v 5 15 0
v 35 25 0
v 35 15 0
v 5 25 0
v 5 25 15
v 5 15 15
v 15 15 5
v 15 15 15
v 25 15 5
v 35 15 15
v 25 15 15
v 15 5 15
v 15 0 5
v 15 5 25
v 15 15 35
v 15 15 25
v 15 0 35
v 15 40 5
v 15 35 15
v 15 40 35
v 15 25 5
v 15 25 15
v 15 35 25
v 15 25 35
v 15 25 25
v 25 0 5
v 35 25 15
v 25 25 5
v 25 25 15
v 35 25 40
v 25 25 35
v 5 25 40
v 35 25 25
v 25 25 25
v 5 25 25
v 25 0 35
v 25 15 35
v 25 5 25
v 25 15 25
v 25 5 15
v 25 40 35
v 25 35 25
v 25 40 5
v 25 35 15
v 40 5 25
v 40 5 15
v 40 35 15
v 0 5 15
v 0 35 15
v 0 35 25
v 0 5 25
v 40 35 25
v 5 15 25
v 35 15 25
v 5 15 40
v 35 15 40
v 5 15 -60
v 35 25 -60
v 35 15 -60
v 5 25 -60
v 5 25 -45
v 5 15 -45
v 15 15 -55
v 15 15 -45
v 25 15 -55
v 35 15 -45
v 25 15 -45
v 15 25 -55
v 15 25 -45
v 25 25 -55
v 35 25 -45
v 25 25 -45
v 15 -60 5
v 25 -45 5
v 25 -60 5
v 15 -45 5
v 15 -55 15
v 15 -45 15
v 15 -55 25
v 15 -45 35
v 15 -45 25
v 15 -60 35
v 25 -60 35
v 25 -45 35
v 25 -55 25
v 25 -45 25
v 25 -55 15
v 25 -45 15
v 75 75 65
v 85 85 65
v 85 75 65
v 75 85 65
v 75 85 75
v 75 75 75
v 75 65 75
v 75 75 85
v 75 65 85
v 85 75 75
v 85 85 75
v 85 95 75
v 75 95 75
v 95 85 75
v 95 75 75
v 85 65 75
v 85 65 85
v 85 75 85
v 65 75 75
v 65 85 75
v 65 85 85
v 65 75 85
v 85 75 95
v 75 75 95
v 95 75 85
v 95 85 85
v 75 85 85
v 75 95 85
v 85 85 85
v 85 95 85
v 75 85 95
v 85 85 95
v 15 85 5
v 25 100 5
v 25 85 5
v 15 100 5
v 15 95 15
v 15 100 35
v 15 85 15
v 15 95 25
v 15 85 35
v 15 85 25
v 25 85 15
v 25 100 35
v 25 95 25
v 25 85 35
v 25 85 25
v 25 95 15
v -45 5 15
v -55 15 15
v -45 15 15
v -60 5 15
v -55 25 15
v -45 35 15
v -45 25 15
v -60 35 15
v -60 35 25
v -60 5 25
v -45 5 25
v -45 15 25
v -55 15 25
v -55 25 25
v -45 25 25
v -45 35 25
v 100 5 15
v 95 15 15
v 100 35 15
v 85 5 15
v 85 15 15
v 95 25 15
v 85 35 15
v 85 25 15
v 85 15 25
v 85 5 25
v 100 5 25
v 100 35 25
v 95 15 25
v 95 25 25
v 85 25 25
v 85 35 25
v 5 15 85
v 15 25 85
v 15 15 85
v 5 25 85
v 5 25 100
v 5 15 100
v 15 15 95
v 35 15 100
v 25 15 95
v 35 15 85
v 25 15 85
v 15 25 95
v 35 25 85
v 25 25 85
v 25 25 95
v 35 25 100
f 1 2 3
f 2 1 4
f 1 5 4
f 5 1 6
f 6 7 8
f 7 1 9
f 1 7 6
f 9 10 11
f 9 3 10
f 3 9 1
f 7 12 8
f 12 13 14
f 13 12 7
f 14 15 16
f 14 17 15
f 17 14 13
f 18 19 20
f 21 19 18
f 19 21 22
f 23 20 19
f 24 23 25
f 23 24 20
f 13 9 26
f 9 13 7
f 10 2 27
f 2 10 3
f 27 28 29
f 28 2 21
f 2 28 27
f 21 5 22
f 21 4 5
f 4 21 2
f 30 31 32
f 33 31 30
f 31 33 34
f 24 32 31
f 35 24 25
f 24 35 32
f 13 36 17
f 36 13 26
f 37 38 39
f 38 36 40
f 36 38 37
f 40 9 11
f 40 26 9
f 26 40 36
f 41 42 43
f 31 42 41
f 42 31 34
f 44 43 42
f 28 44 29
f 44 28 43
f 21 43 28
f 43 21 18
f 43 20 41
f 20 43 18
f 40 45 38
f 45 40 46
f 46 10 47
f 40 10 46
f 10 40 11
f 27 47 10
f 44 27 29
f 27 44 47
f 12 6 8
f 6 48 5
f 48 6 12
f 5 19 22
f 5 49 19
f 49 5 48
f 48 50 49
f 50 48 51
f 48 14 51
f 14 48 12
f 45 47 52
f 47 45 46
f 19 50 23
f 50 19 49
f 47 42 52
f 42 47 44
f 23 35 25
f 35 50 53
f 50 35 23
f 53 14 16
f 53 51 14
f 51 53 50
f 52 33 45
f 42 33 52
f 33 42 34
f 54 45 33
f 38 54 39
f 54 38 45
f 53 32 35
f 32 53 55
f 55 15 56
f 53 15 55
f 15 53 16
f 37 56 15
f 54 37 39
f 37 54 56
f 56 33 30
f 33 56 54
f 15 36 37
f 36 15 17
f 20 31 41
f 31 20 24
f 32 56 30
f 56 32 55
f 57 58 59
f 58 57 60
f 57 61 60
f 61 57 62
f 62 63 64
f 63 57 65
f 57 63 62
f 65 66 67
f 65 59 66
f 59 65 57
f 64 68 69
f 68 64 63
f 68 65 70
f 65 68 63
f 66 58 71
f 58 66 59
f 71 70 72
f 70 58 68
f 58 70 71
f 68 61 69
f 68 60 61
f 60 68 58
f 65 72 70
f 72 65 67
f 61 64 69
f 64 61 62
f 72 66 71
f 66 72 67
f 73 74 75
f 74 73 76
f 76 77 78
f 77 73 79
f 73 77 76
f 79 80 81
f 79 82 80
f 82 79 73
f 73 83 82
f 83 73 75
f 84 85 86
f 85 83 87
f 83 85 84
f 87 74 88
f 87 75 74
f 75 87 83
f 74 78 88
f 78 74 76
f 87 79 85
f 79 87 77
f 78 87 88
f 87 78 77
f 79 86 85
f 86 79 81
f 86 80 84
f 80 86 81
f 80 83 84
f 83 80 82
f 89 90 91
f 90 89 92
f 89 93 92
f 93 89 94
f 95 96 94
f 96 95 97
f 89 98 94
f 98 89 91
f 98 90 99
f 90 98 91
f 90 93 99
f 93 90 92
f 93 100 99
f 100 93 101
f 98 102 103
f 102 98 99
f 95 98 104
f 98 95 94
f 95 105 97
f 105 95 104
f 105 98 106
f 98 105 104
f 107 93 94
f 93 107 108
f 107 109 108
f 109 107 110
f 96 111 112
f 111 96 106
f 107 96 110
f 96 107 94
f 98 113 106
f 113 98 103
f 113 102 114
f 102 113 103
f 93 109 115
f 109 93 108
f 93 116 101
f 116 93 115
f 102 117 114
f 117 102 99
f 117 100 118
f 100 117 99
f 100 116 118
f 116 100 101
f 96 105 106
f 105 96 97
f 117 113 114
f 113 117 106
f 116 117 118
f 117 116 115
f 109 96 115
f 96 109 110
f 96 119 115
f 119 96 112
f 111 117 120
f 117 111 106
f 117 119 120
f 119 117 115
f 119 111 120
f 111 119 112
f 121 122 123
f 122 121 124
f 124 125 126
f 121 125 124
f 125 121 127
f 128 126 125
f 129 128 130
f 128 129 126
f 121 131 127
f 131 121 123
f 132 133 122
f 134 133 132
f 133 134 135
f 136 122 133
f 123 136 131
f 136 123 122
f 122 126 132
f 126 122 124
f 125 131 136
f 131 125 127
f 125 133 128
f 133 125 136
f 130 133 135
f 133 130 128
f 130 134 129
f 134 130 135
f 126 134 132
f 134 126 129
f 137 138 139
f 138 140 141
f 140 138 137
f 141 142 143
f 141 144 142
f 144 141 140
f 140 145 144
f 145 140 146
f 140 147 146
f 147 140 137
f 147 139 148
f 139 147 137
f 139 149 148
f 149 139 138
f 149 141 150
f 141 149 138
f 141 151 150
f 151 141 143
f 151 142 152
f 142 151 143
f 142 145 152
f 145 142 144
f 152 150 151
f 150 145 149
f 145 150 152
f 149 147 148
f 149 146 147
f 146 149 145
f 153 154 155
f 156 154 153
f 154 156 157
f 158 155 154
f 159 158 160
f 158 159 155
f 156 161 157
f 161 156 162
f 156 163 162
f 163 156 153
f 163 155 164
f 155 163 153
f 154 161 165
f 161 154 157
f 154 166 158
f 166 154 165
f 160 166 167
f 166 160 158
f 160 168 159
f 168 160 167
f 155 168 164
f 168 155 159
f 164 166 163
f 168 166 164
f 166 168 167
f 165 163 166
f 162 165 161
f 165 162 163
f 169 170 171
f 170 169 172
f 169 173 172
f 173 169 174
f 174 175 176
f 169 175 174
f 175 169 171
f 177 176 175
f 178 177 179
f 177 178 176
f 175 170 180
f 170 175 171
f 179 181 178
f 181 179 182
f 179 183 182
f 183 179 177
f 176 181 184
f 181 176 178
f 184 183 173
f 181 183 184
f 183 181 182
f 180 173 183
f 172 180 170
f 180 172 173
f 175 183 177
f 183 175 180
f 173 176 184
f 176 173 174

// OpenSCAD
// SCAD file for Six Piece Burr Puzzle
// 整体模型
union() {
  translate([5, 15, 0]) color([1, 0.8, 0, 0.85]) cube([5, 5, 5]);
  translate([10, 15, 0]) color([1, 0.8, 0, 0.85]) cube([5, 5, 5]);
  translate([15, 15, 0]) color([1, 0.8, 0, 0.85]) cube([5, 5, 5]);
  translate([20, 15, 0]) color([1, 0.8, 0, 0.85]) cube([5, 5, 5]);
  translate([25, 15, 0]) color([1, 0.8, 0, 0.85]) cube([5, 5, 5]);
  translate([30, 15, 0]) color([1, 0.8, 0, 0.85]) cube([5, 5, 5]);
  translate([5, 20, 0]) color([1, 0.8, 0, 0.85]) cube([5, 5, 5]);
  translate([10, 20, 0]) color([1, 0.8, 0, 0.85]) cube([5, 5, 5]);
  translate([15, 20, 0]) color([1, 0.8, 0, 0.85]) cube([5, 5, 5]);
  translate([20, 20, 0]) color([1, 0.8, 0, 0.85]) cube([5, 5, 5]);
  translate([25, 20, 0]) color([1, 0.8, 0, 0.85]) cube([5, 5, 5]);
  translate([30, 20, 0]) color([1, 0.8, 0, 0.85]) cube([5, 5, 5]);
  translate([15, 0, 5]) color([0, 0.8, 0, 0.85]) cube([5, 5, 5]);
  translate([20, 0, 5]) color([0, 0.8, 0, 0.85]) cube([5, 5, 5]);
  translate([15, 5, 5]) color([0, 0.8, 0, 0.85]) cube([5, 5, 5]);
  translate([20, 5, 5]) color([0, 0.8, 0, 0.85]) cube([5, 5, 5]);
  translate([15, 10, 5]) color([0, 0.8, 0, 0.85]) cube([5, 5, 5]);
  translate([20, 10, 5]) color([0, 0.8, 0, 0.85]) cube([5, 5, 5]);
  translate([5, 15, 5]) color([1, 0.8, 0, 0.85]) cube([5, 5, 5]);
  translate([10, 15, 5]) color([1, 0.8, 0, 0.85]) cube([5, 5, 5]);
  translate([15, 15, 5]) color([0.8, 0.8, 0.8, 0.85]) cube([5, 5, 5]);
  translate([20, 15, 5]) color([0.8, 0.8, 0.8, 0.85]) cube([5, 5, 5]);
  translate([25, 15, 5]) color([1, 0.8, 0, 0.85]) cube([5, 5, 5]);
  translate([30, 15, 5]) color([1, 0.8, 0, 0.85]) cube([5, 5, 5]);
  translate([5, 20, 5]) color([1, 0.8, 0, 0.85]) cube([5, 5, 5]);
  translate([10, 20, 5]) color([1, 0.8, 0, 0.85]) cube([5, 5, 5]);
  translate([15, 20, 5]) color([0.8, 0.8, 0.8, 0.85]) cube([5, 5, 5]);
  translate([20, 20, 5]) color([0.8, 0.8, 0.8, 0.85]) cube([5, 5, 5]);
  translate([25, 20, 5]) color([1, 0.8, 0, 0.85]) cube([5, 5, 5]);
  translate([30, 20, 5]) color([1, 0.8, 0, 0.85]) cube([5, 5, 5]);
  translate([15, 25, 5]) color([1, 0, 0, 0.85]) cube([5, 5, 5]);
  translate([20, 25, 5]) color([1, 0, 0, 0.85]) cube([5, 5, 5]);
  translate([15, 30, 5]) color([1, 0, 0, 0.85]) cube([5, 5, 5]);
  translate([20, 30, 5]) color([1, 0, 0, 0.85]) cube([5, 5, 5]);
  translate([15, 35, 5]) color([1, 0, 0, 0.85]) cube([5, 5, 5]);
  translate([20, 35, 5]) color([1, 0, 0, 0.85]) cube([5, 5, 5]);
  translate([15, 0, 10]) color([0, 0.8, 0, 0.85]) cube([5, 5, 5]);
  translate([20, 0, 10]) color([0, 0.8, 0, 0.85]) cube([5, 5, 5]);
  translate([15, 5, 10]) color([0, 0.8, 0, 0.85]) cube([5, 5, 5]);
  translate([20, 5, 10]) color([0, 0.8, 0, 0.85]) cube([5, 5, 5]);
  translate([15, 10, 10]) color([0, 0.8, 0, 0.85]) cube([5, 5, 5]);
  translate([20, 10, 10]) color([0, 0.8, 0, 0.85]) cube([5, 5, 5]);
  translate([5, 15, 10]) color([1, 0.8, 0, 0.85]) cube([5, 5, 5]);
  translate([10, 15, 10]) color([1, 0.8, 0, 0.85]) cube([5, 5, 5]);
  translate([15, 15, 10]) color([0.8, 0.8, 0.8, 0.85]) cube([5, 5, 5]);
  translate([20, 15, 10]) color([0.8, 0.8, 0.8, 0.85]) cube([5, 5, 5]);
  translate([25, 15, 10]) color([1, 0.8, 0, 0.85]) cube([5, 5, 5]);
  translate([30, 15, 10]) color([1, 0.8, 0, 0.85]) cube([5, 5, 5]);
  translate([5, 20, 10]) color([1, 0.8, 0, 0.85]) cube([5, 5, 5]);
  translate([10, 20, 10]) color([1, 0.8, 0, 0.85]) cube([5, 5, 5]);
  translate([15, 20, 10]) color([0.8, 0.8, 0.8, 0.85]) cube([5, 5, 5]);
  translate([20, 20, 10]) color([0.8, 0.8, 0.8, 0.85]) cube([5, 5, 5]);
  translate([25, 20, 10]) color([1, 0.8, 0, 0.85]) cube([5, 5, 5]);
  translate([30, 20, 10]) color([1, 0.8, 0, 0.85]) cube([5, 5, 5]);
  translate([15, 25, 10]) color([1, 0, 0, 0.85]) cube([5, 5, 5]);
  translate([20, 25, 10]) color([1, 0, 0, 0.85]) cube([5, 5, 5]);
  translate([15, 30, 10]) color([1, 0, 0, 0.85]) cube([5, 5, 5]);
  translate([20, 30, 10]) color([1, 0, 0, 0.85]) cube([5, 5, 5]);
  translate([15, 35, 10]) color([1, 0, 0, 0.85]) cube([5, 5, 5]);
  translate([20, 35, 10]) color([1, 0, 0, 0.85]) cube([5, 5, 5]);
  translate([15, 0, 15]) color([0, 0.8, 0, 0.85]) cube([5, 5, 5]);
  translate([20, 0, 15]) color([0, 0.8, 0, 0.85]) cube([5, 5, 5]);
  translate([0, 5, 15]) color([0.6, 0, 1, 0.85]) cube([5, 5, 5]);
  translate([5, 5, 15]) color([0.6, 0, 1, 0.85]) cube([5, 5, 5]);
  translate([10, 5, 15]) color([0.6, 0, 1, 0.85]) cube([5, 5, 5]);
  translate([15, 5, 15]) color([0.8, 0.8, 0.8, 0.85]) cube([5, 5, 5]);
  translate([20, 5, 15]) color([0.8, 0.8, 0.8, 0.85]) cube([5, 5, 5]);
  translate([25, 5, 15]) color([1, 0.4, 0, 0.85]) cube([5, 5, 5]);
  translate([30, 5, 15]) color([1, 0.4, 0, 0.85]) cube([5, 5, 5]);
  translate([35, 5, 15]) color([1, 0.4, 0, 0.85]) cube([5, 5, 5]);
  translate([0, 10, 15]) color([0.6, 0, 1, 0.85]) cube([5, 5, 5]);
  translate([5, 10, 15]) color([0.6, 0, 1, 0.85]) cube([5, 5, 5]);
  translate([10, 10, 15]) color([0.6, 0, 1, 0.85]) cube([5, 5, 5]);
  translate([15, 10, 15]) color([0.8, 0.8, 0.8, 0.85]) cube([5, 5, 5]);
  translate([20, 10, 15]) color([0.8, 0.8, 0.8, 0.85]) cube([5, 5, 5]);
  translate([25, 10, 15]) color([1, 0.4, 0, 0.85]) cube([5, 5, 5]);
  translate([30, 10, 15]) color([1, 0.4, 0, 0.85]) cube([5, 5, 5]);
  translate([35, 10, 15]) color([1, 0.4, 0, 0.85]) cube([5, 5, 5]);
  translate([0, 15, 15]) color([0.6, 0, 1, 0.85]) cube([5, 5, 5]);
  translate([5, 15, 15]) color([0.8, 0.8, 0.8, 0.85]) cube([5, 5, 5]);
  translate([10, 15, 15]) color([0.8, 0.8, 0.8, 0.85]) cube([5, 5, 5]);
  translate([15, 15, 15]) color([0.8, 0.8, 0.8, 0.85]) cube([5, 5, 5]);
  translate([20, 15, 15]) color([0.8, 0.8, 0.8, 0.85]) cube([5, 5, 5]);
  translate([25, 15, 15]) color([0.8, 0.8, 0.8, 0.85]) cube([5, 5, 5]);
  translate([30, 15, 15]) color([0.8, 0.8, 0.8, 0.85]) cube([5, 5, 5]);
  translate([35, 15, 15]) color([1, 0.4, 0, 0.85]) cube([5, 5, 5]);
  translate([0, 20, 15]) color([0.6, 0, 1, 0.85]) cube([5, 5, 5]);
  translate([5, 20, 15]) color([0.8, 0.8, 0.8, 0.85]) cube([5, 5, 5]);
  translate([10, 20, 15]) color([0.8, 0.8, 0.8, 0.85]) cube([5, 5, 5]);
  translate([15, 20, 15]) color([0.8, 0.8, 0.8, 0.85]) cube([5, 5, 5]);
  translate([20, 20, 15]) color([0.8, 0.8, 0.8, 0.85]) cube([5, 5, 5]);
  translate([25, 20, 15]) color([0.8, 0.8, 0.8, 0.85]) cube([5, 5, 5]);
  translate([30, 20, 15]) color([0.8, 0.8, 0.8, 0.85]) cube([5, 5, 5]);
  translate([35, 20, 15]) color([1, 0.4, 0, 0.85]) cube([5, 5, 5]);
  translate([0, 25, 15]) color([0.6, 0, 1, 0.85]) cube([5, 5, 5]);
  translate([5, 25, 15]) color([0.6, 0, 1, 0.85]) cube([5, 5, 5]);
  translate([10, 25, 15]) color([0.6, 0, 1, 0.85]) cube([5, 5, 5]);
  translate([15, 25, 15]) color([0.8, 0.8, 0.8, 0.85]) cube([5, 5, 5]);
  translate([20, 25, 15]) color([0.8, 0.8, 0.8, 0.85]) cube([5, 5, 5]);
  translate([25, 25, 15]) color([1, 0.4, 0, 0.85]) cube([5, 5, 5]);
  translate([30, 25, 15]) color([1, 0.4, 0, 0.85]) cube([5, 5, 5]);
  translate([35, 25, 15]) color([1, 0.4, 0, 0.85]) cube([5, 5, 5]);
  translate([0, 30, 15]) color([0.6, 0, 1, 0.85]) cube([5, 5, 5]);
  translate([5, 30, 15]) color([0.6, 0, 1, 0.85]) cube([5, 5, 5]);
  translate([10, 30, 15]) color([0.6, 0, 1, 0.85]) cube([5, 5, 5]);
  translate([15, 30, 15]) color([0.8, 0.8, 0.8, 0.85]) cube([5, 5, 5]);
  translate([20, 30, 15]) color([0.8, 0.8, 0.8, 0.85]) cube([5, 5, 5]);
  translate([25, 30, 15]) color([1, 0.4, 0, 0.85]) cube([5, 5, 5]);
  translate([30, 30, 15]) color([1, 0.4, 0, 0.85]) cube([5, 5, 5]);
  translate([35, 30, 15]) color([1, 0.4, 0, 0.85]) cube([5, 5, 5]);
  translate([15, 35, 15]) color([1, 0, 0, 0.85]) cube([5, 5, 5]);
  translate([20, 35, 15]) color([1, 0, 0, 0.85]) cube([5, 5, 5]);
  translate([15, 0, 20]) color([0, 0.8, 0, 0.85]) cube([5, 5, 5]);
  translate([20, 0, 20]) color([0, 0.8, 0, 0.85]) cube([5, 5, 5]);
  translate([0, 5, 20]) color([0.6, 0, 1, 0.85]) cube([5, 5, 5]);
  translate([5, 5, 20]) color([0.6, 0, 1, 0.85]) cube([5, 5, 5]);
  translate([10, 5, 20]) color([0.6, 0, 1, 0.85]) cube([5, 5, 5]);
  translate([15, 5, 20]) color([0.8, 0.8, 0.8, 0.85]) cube([5, 5, 5]);
  translate([20, 5, 20]) color([0.8, 0.8, 0.8, 0.85]) cube([5, 5, 5]);
  translate([25, 5, 20]) color([1, 0.4, 0, 0.85]) cube([5, 5, 5]);
  translate([30, 5, 20]) color([1, 0.4, 0, 0.85]) cube([5, 5, 5]);
  translate([35, 5, 20]) color([1, 0.4, 0, 0.85]) cube([5, 5, 5]);
  translate([0, 10, 20]) color([0.6, 0, 1, 0.85]) cube([5, 5, 5]);
  translate([5, 10, 20]) color([0.6, 0, 1, 0.85]) cube([5, 5, 5]);
  translate([10, 10, 20]) color([0.6, 0, 1, 0.85]) cube([5, 5, 5]);
  translate([15, 10, 20]) color([0.8, 0.8, 0.8, 0.85]) cube([5, 5, 5]);
  translate([20, 10, 20]) color([0.8, 0.8, 0.8, 0.85]) cube([5, 5, 5]);
  translate([25, 10, 20]) color([1, 0.4, 0, 0.85]) cube([5, 5, 5]);
  translate([30, 10, 20]) color([1, 0.4, 0, 0.85]) cube([5, 5, 5]);
  translate([35, 10, 20]) color([1, 0.4, 0, 0.85]) cube([5, 5, 5]);
  translate([0, 15, 20]) color([0.6, 0, 1, 0.85]) cube([5, 5, 5]);
  translate([5, 15, 20]) color([0.8, 0.8, 0.8, 0.85]) cube([5, 5, 5]);
  translate([10, 15, 20]) color([0.8, 0.8, 0.8, 0.85]) cube([5, 5, 5]);
  translate([15, 15, 20]) color([0.8, 0.8, 0.8, 0.85]) cube([5, 5, 5]);
  translate([20, 15, 20]) color([0.8, 0.8, 0.8, 0.85]) cube([5, 5, 5]);
  translate([25, 15, 20]) color([0.8, 0.8, 0.8, 0.85]) cube([5, 5, 5]);
  translate([30, 15, 20]) color([0.8, 0.8, 0.8, 0.85]) cube([5, 5, 5]);
  translate([35, 15, 20]) color([1, 0.4, 0, 0.85]) cube([5, 5, 5]);
  translate([0, 20, 20]) color([0.6, 0, 1, 0.85]) cube([5, 5, 5]);
  translate([5, 20, 20]) color([0.8, 0.8, 0.8, 0.85]) cube([5, 5, 5]);
  translate([10, 20, 20]) color([0.8, 0.8, 0.8, 0.85]) cube([5, 5, 5]);
  translate([15, 20, 20]) color([0.8, 0.8, 0.8, 0.85]) cube([5, 5, 5]);
  translate([20, 20, 20]) color([0.8, 0.8, 0.8, 0.85]) cube([5, 5, 5]);
  translate([25, 20, 20]) color([0.8, 0.8, 0.8, 0.85]) cube([5, 5, 5]);
  translate([30, 20, 20]) color([0.8, 0.8, 0.8, 0.85]) cube([5, 5, 5]);
  translate([35, 20, 20]) color([1, 0.4, 0, 0.85]) cube([5, 5, 5]);
  translate([0, 25, 20]) color([0.6, 0, 1, 0.85]) cube([5, 5, 5]);
  translate([5, 25, 20]) color([0.6, 0, 1, 0.85]) cube([5, 5, 5]);
  translate([10, 25, 20]) color([0.6, 0, 1, 0.85]) cube([5, 5, 5]);
  translate([15, 25, 20]) color([0.8, 0.8, 0.8, 0.85]) cube([5, 5, 5]);
  translate([20, 25, 20]) color([0.8, 0.8, 0.8, 0.85]) cube([5, 5, 5]);
  translate([25, 25, 20]) color([1, 0.4, 0, 0.85]) cube([5, 5, 5]);
  translate([30, 25, 20]) color([1, 0.4, 0, 0.85]) cube([5, 5, 5]);
  translate([35, 25, 20]) color([1, 0.4, 0, 0.85]) cube([5, 5, 5]);
  translate([0, 30, 20]) color([0.6, 0, 1, 0.85]) cube([5, 5, 5]);
  translate([5, 30, 20]) color([0.6, 0, 1, 0.85]) cube([5, 5, 5]);
  translate([10, 30, 20]) color([0.6, 0, 1, 0.85]) cube([5, 5, 5]);
  translate([15, 30, 20]) color([0.8, 0.8, 0.8, 0.85]) cube([5, 5, 5]);
  translate([20, 30, 20]) color([0.8, 0.8, 0.8, 0.85]) cube([5, 5, 5]);
  translate([25, 30, 20]) color([1, 0.4, 0, 0.85]) cube([5, 5, 5]);
  translate([30, 30, 20]) color([1, 0.4, 0, 0.85]) cube([5, 5, 5]);
  translate([35, 30, 20]) color([1, 0.4, 0, 0.85]) cube([5, 5, 5]);
  translate([15, 35, 20]) color([1, 0, 0, 0.85]) cube([5, 5, 5]);
  translate([20, 35, 20]) color([1, 0, 0, 0.85]) cube([5, 5, 5]);
  translate([15, 0, 25]) color([0, 0.8, 0, 0.85]) cube([5, 5, 5]);
  translate([20, 0, 25]) color([0, 0.8, 0, 0.85]) cube([5, 5, 5]);
  translate([15, 5, 25]) color([0, 0.8, 0, 0.85]) cube([5, 5, 5]);
  translate([20, 5, 25]) color([0, 0.8, 0, 0.85]) cube([5, 5, 5]);
  translate([15, 10, 25]) color([0, 0.8, 0, 0.85]) cube([5, 5, 5]);
  translate([20, 10, 25]) color([0, 0.8, 0, 0.85]) cube([5, 5, 5]);
  translate([5, 15, 25]) color([0, 0.4, 1, 0.85]) cube([5, 5, 5]);
  translate([10, 15, 25]) color([0, 0.4, 1, 0.85]) cube([5, 5, 5]);
  translate([15, 15, 25]) color([0.8, 0.8, 0.8, 0.85]) cube([5, 5, 5]);
  translate([20, 15, 25]) color([0.8, 0.8, 0.8, 0.85]) cube([5, 5, 5]);
  translate([25, 15, 25]) color([0, 0.4, 1, 0.85]) cube([5, 5, 5]);
  translate([30, 15, 25]) color([0, 0.4, 1, 0.85]) cube([5, 5, 5]);
  translate([5, 20, 25]) color([0, 0.4, 1, 0.85]) cube([5, 5, 5]);
  translate([10, 20, 25]) color([0, 0.4, 1, 0.85]) cube([5, 5, 5]);
  translate([15, 20, 25]) color([0.8, 0.8, 0.8, 0.85]) cube([5, 5, 5]);
  translate([20, 20, 25]) color([0.8, 0.8, 0.8, 0.85]) cube([5, 5, 5]);
  translate([25, 20, 25]) color([0, 0.4, 1, 0.85]) cube([5, 5, 5]);
  translate([30, 20, 25]) color([0, 0.4, 1, 0.85]) cube([5, 5, 5]);
  translate([15, 25, 25]) color([1, 0, 0, 0.85]) cube([5, 5, 5]);
  translate([20, 25, 25]) color([1, 0, 0, 0.85]) cube([5, 5, 5]);
  translate([15, 30, 25]) color([1, 0, 0, 0.85]) cube([5, 5, 5]);
  translate([20, 30, 25]) color([1, 0, 0, 0.85]) cube([5, 5, 5]);
  translate([15, 35, 25]) color([1, 0, 0, 0.85]) cube([5, 5, 5]);
  translate([20, 35, 25]) color([1, 0, 0, 0.85]) cube([5, 5, 5]);
  translate([15, 0, 30]) color([0, 0.8, 0, 0.85]) cube([5, 5, 5]);
  translate([20, 0, 30]) color([0, 0.8, 0, 0.85]) cube([5, 5, 5]);
  translate([15, 5, 30]) color([0, 0.8, 0, 0.85]) cube([5, 5, 5]);
  translate([20, 5, 30]) color([0, 0.8, 0, 0.85]) cube([5, 5, 5]);
  translate([15, 10, 30]) color([0, 0.8, 0, 0.85]) cube([5, 5, 5]);
  translate([20, 10, 30]) color([0, 0.8, 0, 0.85]) cube([5, 5, 5]);
  translate([5, 15, 30]) color([0, 0.4, 1, 0.85]) cube([5, 5, 5]);
  translate([10, 15, 30]) color([0, 0.4, 1, 0.85]) cube([5, 5, 5]);
  translate([15, 15, 30]) color([0.8, 0.8, 0.8, 0.85]) cube([5, 5, 5]);
  translate([20, 15, 30]) color([0.8, 0.8, 0.8, 0.85]) cube([5, 5, 5]);
  translate([25, 15, 30]) color([0, 0.4, 1, 0.85]) cube([5, 5, 5]);
  translate([30, 15, 30]) color([0, 0.4, 1, 0.85]) cube([5, 5, 5]);
  translate([5, 20, 30]) color([0, 0.4, 1, 0.85]) cube([5, 5, 5]);
  translate([10, 20, 30]) color([0, 0.4, 1, 0.85]) cube([5, 5, 5]);
  translate([15, 20, 30]) color([0.8, 0.8, 0.8, 0.85]) cube([5, 5, 5]);
  translate([20, 20, 30]) color([0.8, 0.8, 0.8, 0.85]) cube([5, 5, 5]);
  translate([25, 20, 30]) color([0, 0.4, 1, 0.85]) cube([5, 5, 5]);
  translate([30, 20, 30]) color([0, 0.4, 1, 0.85]) cube([5, 5, 5]);
  translate([15, 25, 30]) color([1, 0, 0, 0.85]) cube([5, 5, 5]);
  translate([20, 25, 30]) color([1, 0, 0, 0.85]) cube([5, 5, 5]);
  translate([15, 30, 30]) color([1, 0, 0, 0.85]) cube([5, 5, 5]);
  translate([20, 30, 30]) color([1, 0, 0, 0.85]) cube([5, 5, 5]);
  translate([15, 35, 30]) color([1, 0, 0, 0.85]) cube([5, 5, 5]);
  translate([20, 35, 30]) color([1, 0, 0, 0.85]) cube([5, 5, 5]);
  translate([5, 15, 35]) color([0, 0.4, 1, 0.85]) cube([5, 5, 5]);
  translate([10, 15, 35]) color([0, 0.4, 1, 0.85]) cube([5, 5, 5]);
  translate([15, 15, 35]) color([0, 0.4, 1, 0.85]) cube([5, 5, 5]);
  translate([20, 15, 35]) color([0, 0.4, 1, 0.85]) cube([5, 5, 5]);
  translate([25, 15, 35]) color([0, 0.4, 1, 0.85]) cube([5, 5, 5]);
  translate([30, 15, 35]) color([0, 0.4, 1, 0.85]) cube([5, 5, 5]);
  translate([5, 20, 35]) color([0, 0.4, 1, 0.85]) cube([5, 5, 5]);
  translate([10, 20, 35]) color([0, 0.4, 1, 0.85]) cube([5, 5, 5]);
  translate([15, 20, 35]) color([0, 0.4, 1, 0.85]) cube([5, 5, 5]);
  translate([20, 20, 35]) color([0, 0.4, 1, 0.85]) cube([5, 5, 5]);
  translate([25, 20, 35]) color([0, 0.4, 1, 0.85]) cube([5, 5, 5]);
  translate([30, 20, 35]) color([0, 0.4, 1, 0.85]) cube([5, 5, 5]);
}

// 零件 D
union() {
  translate([5.0, 15.0, -60.0]) color([1, 0.8, 0, 0.85]) cube([5, 5, 5]);
  translate([10.0, 15.0, -60.0]) color([1, 0.8, 0, 0.85]) cube([5, 5, 5]);
  translate([15.0, 15.0, -60.0]) color([1, 0.8, 0, 0.85]) cube([5, 5, 5]);
  translate([20.0, 15.0, -60.0]) color([1, 0.8, 0, 0.85]) cube([5, 5, 5]);
  translate([25.0, 15.0, -60.0]) color([1, 0.8, 0, 0.85]) cube([5, 5, 5]);
  translate([30.0, 15.0, -60.0]) color([1, 0.8, 0, 0.85]) cube([5, 5, 5]);
  translate([5.0, 20.0, -60.0]) color([1, 0.8, 0, 0.85]) cube([5, 5, 5]);
  translate([10.0, 20.0, -60.0]) color([1, 0.8, 0, 0.85]) cube([5, 5, 5]);
  translate([15.0, 20.0, -60.0]) color([1, 0.8, 0, 0.85]) cube([5, 5, 5]);
  translate([20.0, 20.0, -60.0]) color([1, 0.8, 0, 0.85]) cube([5, 5, 5]);
  translate([25.0, 20.0, -60.0]) color([1, 0.8, 0, 0.85]) cube([5, 5, 5]);
  translate([30.0, 20.0, -60.0]) color([1, 0.8, 0, 0.85]) cube([5, 5, 5]);
  translate([5.0, 15.0, -55.0]) color([1, 0.8, 0, 0.85]) cube([5, 5, 5]);
  translate([10.0, 15.0, -55.0]) color([1, 0.8, 0, 0.85]) cube([5, 5, 5]);
  translate([25.0, 15.0, -55.0]) color([1, 0.8, 0, 0.85]) cube([5, 5, 5]);
  translate([30.0, 15.0, -55.0]) color([1, 0.8, 0, 0.85]) cube([5, 5, 5]);
  translate([5.0, 20.0, -55.0]) color([1, 0.8, 0, 0.85]) cube([5, 5, 5]);
  translate([10.0, 20.0, -55.0]) color([1, 0.8, 0, 0.85]) cube([5, 5, 5]);
  translate([25.0, 20.0, -55.0]) color([1, 0.8, 0, 0.85]) cube([5, 5, 5]);
  translate([30.0, 20.0, -55.0]) color([1, 0.8, 0, 0.85]) cube([5, 5, 5]);
  translate([5.0, 15.0, -50.0]) color([1, 0.8, 0, 0.85]) cube([5, 5, 5]);
  translate([10.0, 15.0, -50.0]) color([1, 0.8, 0, 0.85]) cube([5, 5, 5]);
  translate([25.0, 15.0, -50.0]) color([1, 0.8, 0, 0.85]) cube([5, 5, 5]);
  translate([30.0, 15.0, -50.0]) color([1, 0.8, 0, 0.85]) cube([5, 5, 5]);
  translate([5.0, 20.0, -50.0]) color([1, 0.8, 0, 0.85]) cube([5, 5, 5]);
  translate([10.0, 20.0, -50.0]) color([1, 0.8, 0, 0.85]) cube([5, 5, 5]);
  translate([25.0, 20.0, -50.0]) color([1, 0.8, 0, 0.85]) cube([5, 5, 5]);
  translate([30.0, 20.0, -50.0]) color([1, 0.8, 0, 0.85]) cube([5, 5, 5]);
}

// 零件 B
union() {
  translate([15.0, -60.0, 5.0]) color([0, 0.8, 0, 0.85]) cube([5, 5, 5]);
  translate([20.0, -60.0, 5.0]) color([0, 0.8, 0, 0.85]) cube([5, 5, 5]);
  translate([15.0, -55.0, 5.0]) color([0, 0.8, 0, 0.85]) cube([5, 5, 5]);
  translate([20.0, -55.0, 5.0]) color([0, 0.8, 0, 0.85]) cube([5, 5, 5]);
  translate([15.0, -50.0, 5.0]) color([0, 0.8, 0, 0.85]) cube([5, 5, 5]);
  translate([20.0, -50.0, 5.0]) color([0, 0.8, 0, 0.85]) cube([5, 5, 5]);
  translate([15.0, -60.0, 10.0]) color([0, 0.8, 0, 0.85]) cube([5, 5, 5]);
  translate([20.0, -60.0, 10.0]) color([0, 0.8, 0, 0.85]) cube([5, 5, 5]);
  translate([15.0, -55.0, 10.0]) color([0, 0.8, 0, 0.85]) cube([5, 5, 5]);
  translate([20.0, -55.0, 10.0]) color([0, 0.8, 0, 0.85]) cube([5, 5, 5]);
  translate([15.0, -50.0, 10.0]) color([0, 0.8, 0, 0.85]) cube([5, 5, 5]);
  translate([20.0, -50.0, 10.0]) color([0, 0.8, 0, 0.85]) cube([5, 5, 5]);
  translate([15.0, -60.0, 15.0]) color([0, 0.8, 0, 0.85]) cube([5, 5, 5]);
  translate([20.0, -60.0, 15.0]) color([0, 0.8, 0, 0.85]) cube([5, 5, 5]);
  translate([15.0, -60.0, 20.0]) color([0, 0.8, 0, 0.85]) cube([5, 5, 5]);
  translate([20.0, -60.0, 20.0]) color([0, 0.8, 0, 0.85]) cube([5, 5, 5]);
  translate([15.0, -60.0, 25.0]) color([0, 0.8, 0, 0.85]) cube([5, 5, 5]);
  translate([20.0, -60.0, 25.0]) color([0, 0.8, 0, 0.85]) cube([5, 5, 5]);
  translate([15.0, -55.0, 25.0]) color([0, 0.8, 0, 0.85]) cube([5, 5, 5]);
  translate([20.0, -55.0, 25.0]) color([0, 0.8, 0, 0.85]) cube([5, 5, 5]);
  translate([15.0, -50.0, 25.0]) color([0, 0.8, 0, 0.85]) cube([5, 5, 5]);
  translate([20.0, -50.0, 25.0]) color([0, 0.8, 0, 0.85]) cube([5, 5, 5]);
  translate([15.0, -60.0, 30.0]) color([0, 0.8, 0, 0.85]) cube([5, 5, 5]);
  translate([20.0, -60.0, 30.0]) color([0, 0.8, 0, 0.85]) cube([5, 5, 5]);
  translate([15.0, -55.0, 30.0]) color([0, 0.8, 0, 0.85]) cube([5, 5, 5]);
  translate([20.0, -55.0, 30.0]) color([0, 0.8, 0, 0.85]) cube([5, 5, 5]);
  translate([15.0, -50.0, 30.0]) color([0, 0.8, 0, 0.85]) cube([5, 5, 5]);
  translate([20.0, -50.0, 30.0]) color([0, 0.8, 0, 0.85]) cube([5, 5, 5]);
}

// 零件 public
union() {
  translate([75.0, 75.0, 65.0]) color([0.8, 0.8, 0.8, 0.85]) cube([5, 5, 5]);
  translate([80.0, 75.0, 65.0]) color([0.8, 0.8, 0.8, 0.85]) cube([5, 5, 5]);
  translate([75.0, 80.0, 65.0]) color([0.8, 0.8, 0.8, 0.85]) cube([5, 5, 5]);
  translate([80.0, 80.0, 65.0]) color([0.8, 0.8, 0.8, 0.85]) cube([5, 5, 5]);
  translate([75.0, 75.0, 70.0]) color([0.8, 0.8, 0.8, 0.85]) cube([5, 5, 5]);
  translate([80.0, 75.0, 70.0]) color([0.8, 0.8, 0.8, 0.85]) cube([5, 5, 5]);
  translate([75.0, 80.0, 70.0]) color([0.8, 0.8, 0.8, 0.85]) cube([5, 5, 5]);
  translate([80.0, 80.0, 70.0]) color([0.8, 0.8, 0.8, 0.85]) cube([5, 5, 5]);
  translate([75.0, 65.0, 75.0]) color([0.8, 0.8, 0.8, 0.85]) cube([5, 5, 5]);
  translate([80.0, 65.0, 75.0]) color([0.8, 0.8, 0.8, 0.85]) cube([5, 5, 5]);
  translate([75.0, 70.0, 75.0]) color([0.8, 0.8, 0.8, 0.85]) cube([5, 5, 5]);
  translate([80.0, 70.0, 75.0]) color([0.8, 0.8, 0.8, 0.85]) cube([5, 5, 5]);
  translate([65.0, 75.0, 75.0]) color([0.8, 0.8, 0.8, 0.85]) cube([5, 5, 5]);
  translate([70.0, 75.0, 75.0]) color([0.8, 0.8, 0.8, 0.85]) cube([5, 5, 5]);
  translate([75.0, 75.0, 75.0]) color([0.8, 0.8, 0.8, 0.85]) cube([5, 5, 5]);
  translate([80.0, 75.0, 75.0]) color([0.8, 0.8, 0.8, 0.85]) cube([5, 5, 5]);
  translate([85.0, 75.0, 75.0]) color([0.8, 0.8, 0.8, 0.85]) cube([5, 5, 5]);
  translate([90.0, 75.0, 75.0]) color([0.8, 0.8, 0.8, 0.85]) cube([5, 5, 5]);
  translate([65.0, 80.0, 75.0]) color([0.8, 0.8, 0.8, 0.85]) cube([5, 5, 5]);
  translate([70.0, 80.0, 75.0]) color([0.8, 0.8, 0.8, 0.85]) cube([5, 5, 5]);
  translate([75.0, 80.0, 75.0]) color([0.8, 0.8, 0.8, 0.85]) cube([5, 5, 5]);
  translate([80.0, 80.0, 75.0]) color([0.8, 0.8, 0.8, 0.85]) cube([5, 5, 5]);
  translate([85.0, 80.0, 75.0]) color([0.8, 0.8, 0.8, 0.85]) cube([5, 5, 5]);
  translate([90.0, 80.0, 75.0]) color([0.8, 0.8, 0.8, 0.85]) cube([5, 5, 5]);
  translate([75.0, 85.0, 75.0]) color([0.8, 0.8, 0.8, 0.85]) cube([5, 5, 5]);
  translate([80.0, 85.0, 75.0]) color([0.8, 0.8, 0.8, 0.85]) cube([5, 5, 5]);
  translate([75.0, 90.0, 75.0]) color([0.8, 0.8, 0.8, 0.85]) cube([5, 5, 5]);
  translate([80.0, 90.0, 75.0]) color([0.8, 0.8, 0.8, 0.85]) cube([5, 5, 5]);
  translate([75.0, 65.0, 80.0]) color([0.8, 0.8, 0.8, 0.85]) cube([5, 5, 5]);
  translate([80.0, 65.0, 80.0]) color([0.8, 0.8, 0.8, 0.85]) cube([5, 5, 5]);
  translate([75.0, 70.0, 80.0]) color([0.8, 0.8, 0.8, 0.85]) cube([5, 5, 5]);
  translate([80.0, 70.0, 80.0]) color([0.8, 0.8, 0.8, 0.85]) cube([5, 5, 5]);
  translate([65.0, 75.0, 80.0]) color([0.8, 0.8, 0.8, 0.85]) cube([5, 5, 5]);
  translate([70.0, 75.0, 80.0]) color([0.8, 0.8, 0.8, 0.85]) cube([5, 5, 5]);
  translate([75.0, 75.0, 80.0]) color([0.8, 0.8, 0.8, 0.85]) cube([5, 5, 5]);
  translate([80.0, 75.0, 80.0]) color([0.8, 0.8, 0.8, 0.85]) cube([5, 5, 5]);
  translate([85.0, 75.0, 80.0]) color([0.8, 0.8, 0.8, 0.85]) cube([5, 5, 5]);
  translate([90.0, 75.0, 80.0]) color([0.8, 0.8, 0.8, 0.85]) cube([5, 5, 5]);
  translate([65.0, 80.0, 80.0]) color([0.8, 0.8, 0.8, 0.85]) cube([5, 5, 5]);
  translate([70.0, 80.0, 80.0]) color([0.8, 0.8, 0.8, 0.85]) cube([5, 5, 5]);
  translate([75.0, 80.0, 80.0]) color([0.8, 0.8, 0.8, 0.85]) cube([5, 5, 5]);
  translate([80.0, 80.0, 80.0]) color([0.8, 0.8, 0.8, 0.85]) cube([5, 5, 5]);
  translate([85.0, 80.0, 80.0]) color([0.8, 0.8, 0.8, 0.85]) cube([5, 5, 5]);
  translate([90.0, 80.0, 80.0]) color([0.8, 0.8, 0.8, 0.85]) cube([5, 5, 5]);
  translate([75.0, 85.0, 80.0]) color([0.8, 0.8, 0.8, 0.85]) cube([5, 5, 5]);
  translate([80.0, 85.0, 80.0]) color([0.8, 0.8, 0.8, 0.85]) cube([5, 5, 5]);
  translate([75.0, 90.0, 80.0]) color([0.8, 0.8, 0.8, 0.85]) cube([5, 5, 5]);
  translate([80.0, 90.0, 80.0]) color([0.8, 0.8, 0.8, 0.85]) cube([5, 5, 5]);
  translate([75.0, 75.0, 85.0]) color([0.8, 0.8, 0.8, 0.85]) cube([5, 5, 5]);
  translate([80.0, 75.0, 85.0]) color([0.8, 0.8, 0.8, 0.85]) cube([5, 5, 5]);
  translate([75.0, 80.0, 85.0]) color([0.8, 0.8, 0.8, 0.85]) cube([5, 5, 5]);
  translate([80.0, 80.0, 85.0]) color([0.8, 0.8, 0.8, 0.85]) cube([5, 5, 5]);
  translate([75.0, 75.0, 90.0]) color([0.8, 0.8, 0.8, 0.85]) cube([5, 5, 5]);
  translate([80.0, 75.0, 90.0]) color([0.8, 0.8, 0.8, 0.85]) cube([5, 5, 5]);
  translate([75.0, 80.0, 90.0]) color([0.8, 0.8, 0.8, 0.85]) cube([5, 5, 5]);
  translate([80.0, 80.0, 90.0]) color([0.8, 0.8, 0.8, 0.85]) cube([5, 5, 5]);
}

// 零件 A
union() {
  translate([15.0, 85.0, 5.0]) color([1, 0, 0, 0.85]) cube([5, 5, 5]);
  translate([20.0, 85.0, 5.0]) color([1, 0, 0, 0.85]) cube([5, 5, 5]);
  translate([15.0, 90.0, 5.0]) color([1, 0, 0, 0.85]) cube([5, 5, 5]);
  translate([20.0, 90.0, 5.0]) color([1, 0, 0, 0.85]) cube([5, 5, 5]);
  translate([15.0, 95.0, 5.0]) color([1, 0, 0, 0.85]) cube([5, 5, 5]);
  translate([20.0, 95.0, 5.0]) color([1, 0, 0, 0.85]) cube([5, 5, 5]);
  translate([15.0, 85.0, 10.0]) color([1, 0, 0, 0.85]) cube([5, 5, 5]);
  translate([20.0, 85.0, 10.0]) color([1, 0, 0, 0.85]) cube([5, 5, 5]);
  translate([15.0, 90.0, 10.0]) color([1, 0, 0, 0.85]) cube([5, 5, 5]);
  translate([20.0, 90.0, 10.0]) color([1, 0, 0, 0.85]) cube([5, 5, 5]);
  translate([15.0, 95.0, 10.0]) color([1, 0, 0, 0.85]) cube([5, 5, 5]);
  translate([20.0, 95.0, 10.0]) color([1, 0, 0, 0.85]) cube([5, 5, 5]);
  translate([15.0, 95.0, 15.0]) color([1, 0, 0, 0.85]) cube([5, 5, 5]);
  translate([20.0, 95.0, 15.0]) color([1, 0, 0, 0.85]) cube([5, 5, 5]);
  translate([15.0, 95.0, 20.0]) color([1, 0, 0, 0.85]) cube([5, 5, 5]);
  translate([20.0, 95.0, 20.0]) color([1, 0, 0, 0.85]) cube([5, 5, 5]);
  translate([15.0, 85.0, 25.0]) color([1, 0, 0, 0.85]) cube([5, 5, 5]);
  translate([20.0, 85.0, 25.0]) color([1, 0, 0, 0.85]) cube([5, 5, 5]);
  translate([15.0, 90.0, 25.0]) color([1, 0, 0, 0.85]) cube([5, 5, 5]);
  translate([20.0, 90.0, 25.0]) color([1, 0, 0, 0.85]) cube([5, 5, 5]);
  translate([15.0, 95.0, 25.0]) color([1, 0, 0, 0.85]) cube([5, 5, 5]);
  translate([20.0, 95.0, 25.0]) color([1, 0, 0, 0.85]) cube([5, 5, 5]);
  translate([15.0, 85.0, 30.0]) color([1, 0, 0, 0.85]) cube([5, 5, 5]);
  translate([20.0, 85.0, 30.0]) color([1, 0, 0, 0.85]) cube([5, 5, 5]);
  translate([15.0, 90.0, 30.0]) color([1, 0, 0, 0.85]) cube([5, 5, 5]);
  translate([20.0, 90.0, 30.0]) color([1, 0, 0, 0.85]) cube([5, 5, 5]);
  translate([15.0, 95.0, 30.0]) color([1, 0, 0, 0.85]) cube([5, 5, 5]);
  translate([20.0, 95.0, 30.0]) color([1, 0, 0, 0.85]) cube([5, 5, 5]);
}

// 零件 F
union() {
  translate([-60.0, 5.0, 15.0]) color([0.6, 0, 1, 0.85]) cube([5, 5, 5]);
  translate([-55.0, 5.0, 15.0]) color([0.6, 0, 1, 0.85]) cube([5, 5, 5]);
  translate([-50.0, 5.0, 15.0]) color([0.6, 0, 1, 0.85]) cube([5, 5, 5]);
  translate([-60.0, 10.0, 15.0]) color([0.6, 0, 1, 0.85]) cube([5, 5, 5]);
  translate([-55.0, 10.0, 15.0]) color([0.6, 0, 1, 0.85]) cube([5, 5, 5]);
  translate([-50.0, 10.0, 15.0]) color([0.6, 0, 1, 0.85]) cube([5, 5, 5]);
  translate([-60.0, 15.0, 15.0]) color([0.6, 0, 1, 0.85]) cube([5, 5, 5]);
  translate([-60.0, 20.0, 15.0]) color([0.6, 0, 1, 0.85]) cube([5, 5, 5]);
  translate([-60.0, 25.0, 15.0]) color([0.6, 0, 1, 0.85]) cube([5, 5, 5]);
  translate([-55.0, 25.0, 15.0]) color([0.6, 0, 1, 0.85]) cube([5, 5, 5]);
  translate([-50.0, 25.0, 15.0]) color([0.6, 0, 1, 0.85]) cube([5, 5, 5]);
  translate([-60.0, 30.0, 15.0]) color([0.6, 0, 1, 0.85]) cube([5, 5, 5]);
  translate([-55.0, 30.0, 15.0]) color([0.6, 0, 1, 0.85]) cube([5, 5, 5]);
  translate([-50.0, 30.0, 15.0]) color([0.6, 0, 1, 0.85]) cube([5, 5, 5]);
  translate([-60.0, 5.0, 20.0]) color([0.6, 0, 1, 0.85]) cube([5, 5, 5]);
  translate([-55.0, 5.0, 20.0]) color([0.6, 0, 1, 0.85]) cube([5, 5, 5]);
  translate([-50.0, 5.0, 20.0]) color([0.6, 0, 1, 0.85]) cube([5, 5, 5]);
  translate([-60.0, 10.0, 20.0]) color([0.6, 0, 1, 0.85]) cube([5, 5, 5]);
  translate([-55.0, 10.0, 20.0]) color([0.6, 0, 1, 0.85]) cube([5, 5, 5]);
  translate([-50.0, 10.0, 20.0]) color([0.6, 0, 1, 0.85]) cube([5, 5, 5]);
  translate([-60.0, 15.0, 20.0]) color([0.6, 0, 1, 0.85]) cube([5, 5, 5]);
  translate([-60.0, 20.0, 20.0]) color([0.6, 0, 1, 0.85]) cube([5, 5, 5]);
  translate([-60.0, 25.0, 20.0]) color([0.6, 0, 1, 0.85]) cube([5, 5, 5]);
  translate([-55.0, 25.0, 20.0]) color([0.6, 0, 1, 0.85]) cube([5, 5, 5]);
  translate([-50.0, 25.0, 20.0]) color([0.6, 0, 1, 0.85]) cube([5, 5, 5]);
  translate([-60.0, 30.0, 20.0]) color([0.6, 0, 1, 0.85]) cube([5, 5, 5]);
  translate([-55.0, 30.0, 20.0]) color([0.6, 0, 1, 0.85]) cube([5, 5, 5]);
  translate([-50.0, 30.0, 20.0]) color([0.6, 0, 1, 0.85]) cube([5, 5, 5]);
}

// 零件 E
union() {
  translate([85.0, 5.0, 15.0]) color([1, 0.4, 0, 0.85]) cube([5, 5, 5]);
  translate([90.0, 5.0, 15.0]) color([1, 0.4, 0, 0.85]) cube([5, 5, 5]);
  translate([95.0, 5.0, 15.0]) color([1, 0.4, 0, 0.85]) cube([5, 5, 5]);
  translate([85.0, 10.0, 15.0]) color([1, 0.4, 0, 0.85]) cube([5, 5, 5]);
  translate([90.0, 10.0, 15.0]) color([1, 0.4, 0, 0.85]) cube([5, 5, 5]);
  translate([95.0, 10.0, 15.0]) color([1, 0.4, 0, 0.85]) cube([5, 5, 5]);
  translate([95.0, 15.0, 15.0]) color([1, 0.4, 0, 0.85]) cube([5, 5, 5]);
  translate([95.0, 20.0, 15.0]) color([1, 0.4, 0, 0.85]) cube([5, 5, 5]);
  translate([85.0, 25.0, 15.0]) color([1, 0.4, 0, 0.85]) cube([5, 5, 5]);
  translate([90.0, 25.0, 15.0]) color([1, 0.4, 0, 0.85]) cube([5, 5, 5]);
  translate([95.0, 25.0, 15.0]) color([1, 0.4, 0, 0.85]) cube([5, 5, 5]);
  translate([85.0, 30.0, 15.0]) color([1, 0.4, 0, 0.85]) cube([5, 5, 5]);
  translate([90.0, 30.0, 15.0]) color([1, 0.4, 0, 0.85]) cube([5, 5, 5]);
  translate([95.0, 30.0, 15.0]) color([1, 0.4, 0, 0.85]) cube([5, 5, 5]);
  translate([85.0, 5.0, 20.0]) color([1, 0.4, 0, 0.85]) cube([5, 5, 5]);
  translate([90.0, 5.0, 20.0]) color([1, 0.4, 0, 0.85]) cube([5, 5, 5]);
  translate([95.0, 5.0, 20.0]) color([1, 0.4, 0, 0.85]) cube([5, 5, 5]);
  translate([85.0, 10.0, 20.0]) color([1, 0.4, 0, 0.85]) cube([5, 5, 5]);
  translate([90.0, 10.0, 20.0]) color([1, 0.4, 0, 0.85]) cube([5, 5, 5]);
  translate([95.0, 10.0, 20.0]) color([1, 0.4, 0, 0.85]) cube([5, 5, 5]);
  translate([95.0, 15.0, 20.0]) color([1, 0.4, 0, 0.85]) cube([5, 5, 5]);
  translate([95.0, 20.0, 20.0]) color([1, 0.4, 0, 0.85]) cube([5, 5, 5]);
  translate([85.0, 25.0, 20.0]) color([1, 0.4, 0, 0.85]) cube([5, 5, 5]);
  translate([90.0, 25.0, 20.0]) color([1, 0.4, 0, 0.85]) cube([5, 5, 5]);
  translate([95.0, 25.0, 20.0]) color([1, 0.4, 0, 0.85]) cube([5, 5, 5]);
  translate([85.0, 30.0, 20.0]) color([1, 0.4, 0, 0.85]) cube([5, 5, 5]);
  translate([90.0, 30.0, 20.0]) color([1, 0.4, 0, 0.85]) cube([5, 5, 5]);
  translate([95.0, 30.0, 20.0]) color([1, 0.4, 0, 0.85]) cube([5, 5, 5]);
}

// 零件 C
union() {
  translate([5.0, 15.0, 85.0]) color([0, 0.4, 1, 0.85]) cube([5, 5, 5]);
  translate([10.0, 15.0, 85.0]) color([0, 0.4, 1, 0.85]) cube([5, 5, 5]);
  translate([25.0, 15.0, 85.0]) color([0, 0.4, 1, 0.85]) cube([5, 5, 5]);
  translate([30.0, 15.0, 85.0]) color([0, 0.4, 1, 0.85]) cube([5, 5, 5]);
  translate([5.0, 20.0, 85.0]) color([0, 0.4, 1, 0.85]) cube([5, 5, 5]);
  translate([10.0, 20.0, 85.0]) color([0, 0.4, 1, 0.85]) cube([5, 5, 5]);
  translate([25.0, 20.0, 85.0]) color([0, 0.4, 1, 0.85]) cube([5, 5, 5]);
  translate([30.0, 20.0, 85.0]) color([0, 0.4, 1, 0.85]) cube([5, 5, 5]);
  translate([5.0, 15.0, 90.0]) color([0, 0.4, 1, 0.85]) cube([5, 5, 5]);
  translate([10.0, 15.0, 90.0]) color([0, 0.4, 1, 0.85]) cube([5, 5, 5]);
  translate([25.0, 15.0, 90.0]) color([0, 0.4, 1, 0.85]) cube([5, 5, 5]);
  translate([30.0, 15.0, 90.0]) color([0, 0.4, 1, 0.85]) cube([5, 5, 5]);
  translate([5.0, 20.0, 90.0]) color([0, 0.4, 1, 0.85]) cube([5, 5, 5]);
  translate([10.0, 20.0, 90.0]) color([0, 0.4, 1, 0.85]) cube([5, 5, 5]);
  translate([25.0, 20.0, 90.0]) color([0, 0.4, 1, 0.85]) cube([5, 5, 5]);
  translate([30.0, 20.0, 90.0]) color([0, 0.4, 1, 0.85]) cube([5, 5, 5]);
  translate([5.0, 15.0, 95.0]) color([0, 0.4, 1, 0.85]) cube([5, 5, 5]);
  translate([10.0, 15.0, 95.0]) color([0, 0.4, 1, 0.85]) cube([5, 5, 5]);
  translate([15.0, 15.0, 95.0]) color([0, 0.4, 1, 0.85]) cube([5, 5, 5]);
  translate([20.0, 15.0, 95.0]) color([0, 0.4, 1, 0.85]) cube([5, 5, 5]);
  translate([25.0, 15.0, 95.0]) color([0, 0.4, 1, 0.85]) cube([5, 5, 5]);
  translate([30.0, 15.0, 95.0]) color([0, 0.4, 1, 0.85]) cube([5, 5, 5]);
  translate([5.0, 20.0, 95.0]) color([0, 0.4, 1, 0.85]) cube([5, 5, 5]);
  translate([10.0, 20.0, 95.0]) color([0, 0.4, 1, 0.85]) cube([5, 5, 5]);
  translate([15.0, 20.0, 95.0]) color([0, 0.4, 1, 0.85]) cube([5, 5, 5]);
  translate([20.0, 20.0, 95.0]) color([0, 0.4, 1, 0.85]) cube([5, 5, 5]);
  translate([25.0, 20.0, 95.0]) color([0, 0.4, 1, 0.85]) cube([5, 5, 5]);
  translate([30.0, 20.0, 95.0]) color([0, 0.4, 1, 0.85]) cube([5, 5, 5]);
}
